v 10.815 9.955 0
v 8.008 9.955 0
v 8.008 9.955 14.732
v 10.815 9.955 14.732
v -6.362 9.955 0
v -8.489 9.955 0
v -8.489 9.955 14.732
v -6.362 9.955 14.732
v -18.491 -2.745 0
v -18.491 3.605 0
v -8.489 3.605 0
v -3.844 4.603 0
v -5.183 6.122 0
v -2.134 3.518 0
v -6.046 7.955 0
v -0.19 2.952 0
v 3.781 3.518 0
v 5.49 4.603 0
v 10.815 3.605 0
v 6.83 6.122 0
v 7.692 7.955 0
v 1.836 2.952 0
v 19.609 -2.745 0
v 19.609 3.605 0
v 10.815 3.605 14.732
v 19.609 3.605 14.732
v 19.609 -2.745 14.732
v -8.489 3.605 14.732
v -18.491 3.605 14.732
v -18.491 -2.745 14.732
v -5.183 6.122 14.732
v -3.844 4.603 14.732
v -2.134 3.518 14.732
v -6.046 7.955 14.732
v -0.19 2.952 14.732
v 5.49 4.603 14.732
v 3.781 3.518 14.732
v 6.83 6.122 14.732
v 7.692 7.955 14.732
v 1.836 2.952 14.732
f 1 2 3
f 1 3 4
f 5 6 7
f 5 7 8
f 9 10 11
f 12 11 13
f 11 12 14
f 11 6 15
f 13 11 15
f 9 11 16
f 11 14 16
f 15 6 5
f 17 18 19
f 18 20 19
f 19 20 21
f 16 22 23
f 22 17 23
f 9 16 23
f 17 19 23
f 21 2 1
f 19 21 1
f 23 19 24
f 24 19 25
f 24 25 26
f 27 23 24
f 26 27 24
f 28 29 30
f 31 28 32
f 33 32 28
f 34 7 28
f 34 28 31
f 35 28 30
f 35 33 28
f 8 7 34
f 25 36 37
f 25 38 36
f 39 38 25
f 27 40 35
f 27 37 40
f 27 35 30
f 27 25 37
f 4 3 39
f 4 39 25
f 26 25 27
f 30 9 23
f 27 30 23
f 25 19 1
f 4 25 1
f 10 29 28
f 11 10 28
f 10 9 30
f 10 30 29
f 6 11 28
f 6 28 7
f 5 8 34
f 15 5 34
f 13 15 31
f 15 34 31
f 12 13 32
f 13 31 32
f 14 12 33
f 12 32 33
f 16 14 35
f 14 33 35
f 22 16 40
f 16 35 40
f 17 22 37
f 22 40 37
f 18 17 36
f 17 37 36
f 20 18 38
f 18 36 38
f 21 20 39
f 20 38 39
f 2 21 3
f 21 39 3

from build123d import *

# Parameters (mm, degrees)
F1_W     = 19.304
F1_H     = 6.35
F2_DEPTH = 14.732
F0_W     = 38.1
F0_H     = 6.35
F3_DEPTH = 14.732
F5_R     = 7.186013
F6_DEPTH = 14.733


with BuildPart() as f2:
    # F1 (on face) → F2 (new body)
    with BuildSketch(Plane.XY):
        with Locations((1.162567, 6.780102)):
            Rectangle(F1_W, F1_H)
    extrude(amount=F2_DEPTH)

    # F0 (on Top) → F3 (join)
    with BuildSketch(Plane.XY):
        with Locations((0.559317, 0.430102)):
            Rectangle(F0_W, F0_H)
    extrude(amount=F3_DEPTH)

    # F5 (on face) → F6 (cut, through all)
    with BuildSketch(Plane.XY.offset(14.732)):
        with Locations((0.823092, 10.066757)):
            Circle(F5_R)
    extrude(amount=-F6_DEPTH, mode=Mode.SUBTRACT)


solid = f2.part
